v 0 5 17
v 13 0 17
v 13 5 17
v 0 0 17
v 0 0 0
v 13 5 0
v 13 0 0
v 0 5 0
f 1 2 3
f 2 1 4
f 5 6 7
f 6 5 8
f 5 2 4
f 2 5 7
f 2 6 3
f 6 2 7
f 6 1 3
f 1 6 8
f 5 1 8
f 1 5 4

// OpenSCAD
// Generated by SolidPython 1.0.1 on 2020-07-29 00:46:55


cube(size = [13, 5, 17]);
/***********************************************
*********      SolidPython code:      **********
************************************************
 
# import packages: SolidPython
from solid import *
from solid.utils import *
from itertools import chain, combinations, permutations


class Resize:

    def __init__(self, scad_file):
        self.scad_file = scad_file
        #self.scad_file = import_scad(scad_file)
        # cone/cylinder param:
        self.r1 = 0
        self.r2 = 0
        self.h = 0
        # rectangular prism param:
        self.w = 0
        self.l = 0
        # ellipse param:
        self.r = 0

    # import OpenScad code (file name corresponds to shape)


    # classify shape + parameters
    def assign(self, param1, param2, param3):
        if self.scad_file == 'cone.scad':
            self.r1 = param1
            self.r2 = param2
            self.h = param3
        elif self.scad_file == 'cylinder.scad':
            self.r1 = param1
            self.r2 = param2
            self.h = param3
        elif self.scad_file == 'rectangularPrism.scad':
            self.h = param1
            self.l = param2
            self.w = param3
        else:
            self.r = param1
            self.h = param2

    # resize parameters
    def iterate(self):
        x = range(3, 20, 2)
        i = 1
        if self.scad_file == 'cone.scad':
            tempList = list(permutations(x, 2))
            for temp in tempList:
                param1 = temp[0]
                param2 = temp[1]
                filepath = 'produced_scad_files/' + 'cone' + str(param1) + '_' + str(param2) + '_' + '.scad'
                scad_render_to_file(cylinder(h=param1, r1=param2, r2=0), filepath)

        elif self.scad_file == 'cylinder.scad':
            tempList = list(permutations(x, 3))
            for temp in tempList:
                param1 = temp[0]
                param2 = temp[1]
                filepath = 'produced_scad_files/' + 'cylinder' + str(param1) + '_' + str(param2) + '_' + '.scad'
                scad_render_to_file(cylinder(h=param1, r1=param2, r2=param2), filepath)

        elif self.scad_file == 'rectangularPrism.scad':
            tempList = list(permutations(x, 3))
            for temp in tempList:
                param1 = temp[0]
                param2 = temp[1]
                param3 = temp[2]
                filepath = 'produced_scad_files/' + 'rectangularPrism' + str(param1) + '_' + str(param2) + '_' + str(
                    param3) + '.scad'
                scad_render_to_file(cube(size=(param1, param2, param3)), filepath)

        elif self.scad_file == 'ellipse.scad':
            tempList = list(permutations(x, 4))
            for temp in tempList:
                param1 = temp[0]
                param2 = temp[1]
                param3 = temp[2]
                param4 = temp[3]
                filepath = 'produced_scad_files/' + 'ellipse' + str(param1) + '_' + str(param2) + '_' + str(param3) + '_' + str(param4) + '.scad'
                scad_render_to_file(scale([param1, param2, param3])(sphere(r=param4)), filepath)

    def render_to_scadfile(self):
        scad_render_to_file(scad, 'example.scad') 
 
************************************************/
